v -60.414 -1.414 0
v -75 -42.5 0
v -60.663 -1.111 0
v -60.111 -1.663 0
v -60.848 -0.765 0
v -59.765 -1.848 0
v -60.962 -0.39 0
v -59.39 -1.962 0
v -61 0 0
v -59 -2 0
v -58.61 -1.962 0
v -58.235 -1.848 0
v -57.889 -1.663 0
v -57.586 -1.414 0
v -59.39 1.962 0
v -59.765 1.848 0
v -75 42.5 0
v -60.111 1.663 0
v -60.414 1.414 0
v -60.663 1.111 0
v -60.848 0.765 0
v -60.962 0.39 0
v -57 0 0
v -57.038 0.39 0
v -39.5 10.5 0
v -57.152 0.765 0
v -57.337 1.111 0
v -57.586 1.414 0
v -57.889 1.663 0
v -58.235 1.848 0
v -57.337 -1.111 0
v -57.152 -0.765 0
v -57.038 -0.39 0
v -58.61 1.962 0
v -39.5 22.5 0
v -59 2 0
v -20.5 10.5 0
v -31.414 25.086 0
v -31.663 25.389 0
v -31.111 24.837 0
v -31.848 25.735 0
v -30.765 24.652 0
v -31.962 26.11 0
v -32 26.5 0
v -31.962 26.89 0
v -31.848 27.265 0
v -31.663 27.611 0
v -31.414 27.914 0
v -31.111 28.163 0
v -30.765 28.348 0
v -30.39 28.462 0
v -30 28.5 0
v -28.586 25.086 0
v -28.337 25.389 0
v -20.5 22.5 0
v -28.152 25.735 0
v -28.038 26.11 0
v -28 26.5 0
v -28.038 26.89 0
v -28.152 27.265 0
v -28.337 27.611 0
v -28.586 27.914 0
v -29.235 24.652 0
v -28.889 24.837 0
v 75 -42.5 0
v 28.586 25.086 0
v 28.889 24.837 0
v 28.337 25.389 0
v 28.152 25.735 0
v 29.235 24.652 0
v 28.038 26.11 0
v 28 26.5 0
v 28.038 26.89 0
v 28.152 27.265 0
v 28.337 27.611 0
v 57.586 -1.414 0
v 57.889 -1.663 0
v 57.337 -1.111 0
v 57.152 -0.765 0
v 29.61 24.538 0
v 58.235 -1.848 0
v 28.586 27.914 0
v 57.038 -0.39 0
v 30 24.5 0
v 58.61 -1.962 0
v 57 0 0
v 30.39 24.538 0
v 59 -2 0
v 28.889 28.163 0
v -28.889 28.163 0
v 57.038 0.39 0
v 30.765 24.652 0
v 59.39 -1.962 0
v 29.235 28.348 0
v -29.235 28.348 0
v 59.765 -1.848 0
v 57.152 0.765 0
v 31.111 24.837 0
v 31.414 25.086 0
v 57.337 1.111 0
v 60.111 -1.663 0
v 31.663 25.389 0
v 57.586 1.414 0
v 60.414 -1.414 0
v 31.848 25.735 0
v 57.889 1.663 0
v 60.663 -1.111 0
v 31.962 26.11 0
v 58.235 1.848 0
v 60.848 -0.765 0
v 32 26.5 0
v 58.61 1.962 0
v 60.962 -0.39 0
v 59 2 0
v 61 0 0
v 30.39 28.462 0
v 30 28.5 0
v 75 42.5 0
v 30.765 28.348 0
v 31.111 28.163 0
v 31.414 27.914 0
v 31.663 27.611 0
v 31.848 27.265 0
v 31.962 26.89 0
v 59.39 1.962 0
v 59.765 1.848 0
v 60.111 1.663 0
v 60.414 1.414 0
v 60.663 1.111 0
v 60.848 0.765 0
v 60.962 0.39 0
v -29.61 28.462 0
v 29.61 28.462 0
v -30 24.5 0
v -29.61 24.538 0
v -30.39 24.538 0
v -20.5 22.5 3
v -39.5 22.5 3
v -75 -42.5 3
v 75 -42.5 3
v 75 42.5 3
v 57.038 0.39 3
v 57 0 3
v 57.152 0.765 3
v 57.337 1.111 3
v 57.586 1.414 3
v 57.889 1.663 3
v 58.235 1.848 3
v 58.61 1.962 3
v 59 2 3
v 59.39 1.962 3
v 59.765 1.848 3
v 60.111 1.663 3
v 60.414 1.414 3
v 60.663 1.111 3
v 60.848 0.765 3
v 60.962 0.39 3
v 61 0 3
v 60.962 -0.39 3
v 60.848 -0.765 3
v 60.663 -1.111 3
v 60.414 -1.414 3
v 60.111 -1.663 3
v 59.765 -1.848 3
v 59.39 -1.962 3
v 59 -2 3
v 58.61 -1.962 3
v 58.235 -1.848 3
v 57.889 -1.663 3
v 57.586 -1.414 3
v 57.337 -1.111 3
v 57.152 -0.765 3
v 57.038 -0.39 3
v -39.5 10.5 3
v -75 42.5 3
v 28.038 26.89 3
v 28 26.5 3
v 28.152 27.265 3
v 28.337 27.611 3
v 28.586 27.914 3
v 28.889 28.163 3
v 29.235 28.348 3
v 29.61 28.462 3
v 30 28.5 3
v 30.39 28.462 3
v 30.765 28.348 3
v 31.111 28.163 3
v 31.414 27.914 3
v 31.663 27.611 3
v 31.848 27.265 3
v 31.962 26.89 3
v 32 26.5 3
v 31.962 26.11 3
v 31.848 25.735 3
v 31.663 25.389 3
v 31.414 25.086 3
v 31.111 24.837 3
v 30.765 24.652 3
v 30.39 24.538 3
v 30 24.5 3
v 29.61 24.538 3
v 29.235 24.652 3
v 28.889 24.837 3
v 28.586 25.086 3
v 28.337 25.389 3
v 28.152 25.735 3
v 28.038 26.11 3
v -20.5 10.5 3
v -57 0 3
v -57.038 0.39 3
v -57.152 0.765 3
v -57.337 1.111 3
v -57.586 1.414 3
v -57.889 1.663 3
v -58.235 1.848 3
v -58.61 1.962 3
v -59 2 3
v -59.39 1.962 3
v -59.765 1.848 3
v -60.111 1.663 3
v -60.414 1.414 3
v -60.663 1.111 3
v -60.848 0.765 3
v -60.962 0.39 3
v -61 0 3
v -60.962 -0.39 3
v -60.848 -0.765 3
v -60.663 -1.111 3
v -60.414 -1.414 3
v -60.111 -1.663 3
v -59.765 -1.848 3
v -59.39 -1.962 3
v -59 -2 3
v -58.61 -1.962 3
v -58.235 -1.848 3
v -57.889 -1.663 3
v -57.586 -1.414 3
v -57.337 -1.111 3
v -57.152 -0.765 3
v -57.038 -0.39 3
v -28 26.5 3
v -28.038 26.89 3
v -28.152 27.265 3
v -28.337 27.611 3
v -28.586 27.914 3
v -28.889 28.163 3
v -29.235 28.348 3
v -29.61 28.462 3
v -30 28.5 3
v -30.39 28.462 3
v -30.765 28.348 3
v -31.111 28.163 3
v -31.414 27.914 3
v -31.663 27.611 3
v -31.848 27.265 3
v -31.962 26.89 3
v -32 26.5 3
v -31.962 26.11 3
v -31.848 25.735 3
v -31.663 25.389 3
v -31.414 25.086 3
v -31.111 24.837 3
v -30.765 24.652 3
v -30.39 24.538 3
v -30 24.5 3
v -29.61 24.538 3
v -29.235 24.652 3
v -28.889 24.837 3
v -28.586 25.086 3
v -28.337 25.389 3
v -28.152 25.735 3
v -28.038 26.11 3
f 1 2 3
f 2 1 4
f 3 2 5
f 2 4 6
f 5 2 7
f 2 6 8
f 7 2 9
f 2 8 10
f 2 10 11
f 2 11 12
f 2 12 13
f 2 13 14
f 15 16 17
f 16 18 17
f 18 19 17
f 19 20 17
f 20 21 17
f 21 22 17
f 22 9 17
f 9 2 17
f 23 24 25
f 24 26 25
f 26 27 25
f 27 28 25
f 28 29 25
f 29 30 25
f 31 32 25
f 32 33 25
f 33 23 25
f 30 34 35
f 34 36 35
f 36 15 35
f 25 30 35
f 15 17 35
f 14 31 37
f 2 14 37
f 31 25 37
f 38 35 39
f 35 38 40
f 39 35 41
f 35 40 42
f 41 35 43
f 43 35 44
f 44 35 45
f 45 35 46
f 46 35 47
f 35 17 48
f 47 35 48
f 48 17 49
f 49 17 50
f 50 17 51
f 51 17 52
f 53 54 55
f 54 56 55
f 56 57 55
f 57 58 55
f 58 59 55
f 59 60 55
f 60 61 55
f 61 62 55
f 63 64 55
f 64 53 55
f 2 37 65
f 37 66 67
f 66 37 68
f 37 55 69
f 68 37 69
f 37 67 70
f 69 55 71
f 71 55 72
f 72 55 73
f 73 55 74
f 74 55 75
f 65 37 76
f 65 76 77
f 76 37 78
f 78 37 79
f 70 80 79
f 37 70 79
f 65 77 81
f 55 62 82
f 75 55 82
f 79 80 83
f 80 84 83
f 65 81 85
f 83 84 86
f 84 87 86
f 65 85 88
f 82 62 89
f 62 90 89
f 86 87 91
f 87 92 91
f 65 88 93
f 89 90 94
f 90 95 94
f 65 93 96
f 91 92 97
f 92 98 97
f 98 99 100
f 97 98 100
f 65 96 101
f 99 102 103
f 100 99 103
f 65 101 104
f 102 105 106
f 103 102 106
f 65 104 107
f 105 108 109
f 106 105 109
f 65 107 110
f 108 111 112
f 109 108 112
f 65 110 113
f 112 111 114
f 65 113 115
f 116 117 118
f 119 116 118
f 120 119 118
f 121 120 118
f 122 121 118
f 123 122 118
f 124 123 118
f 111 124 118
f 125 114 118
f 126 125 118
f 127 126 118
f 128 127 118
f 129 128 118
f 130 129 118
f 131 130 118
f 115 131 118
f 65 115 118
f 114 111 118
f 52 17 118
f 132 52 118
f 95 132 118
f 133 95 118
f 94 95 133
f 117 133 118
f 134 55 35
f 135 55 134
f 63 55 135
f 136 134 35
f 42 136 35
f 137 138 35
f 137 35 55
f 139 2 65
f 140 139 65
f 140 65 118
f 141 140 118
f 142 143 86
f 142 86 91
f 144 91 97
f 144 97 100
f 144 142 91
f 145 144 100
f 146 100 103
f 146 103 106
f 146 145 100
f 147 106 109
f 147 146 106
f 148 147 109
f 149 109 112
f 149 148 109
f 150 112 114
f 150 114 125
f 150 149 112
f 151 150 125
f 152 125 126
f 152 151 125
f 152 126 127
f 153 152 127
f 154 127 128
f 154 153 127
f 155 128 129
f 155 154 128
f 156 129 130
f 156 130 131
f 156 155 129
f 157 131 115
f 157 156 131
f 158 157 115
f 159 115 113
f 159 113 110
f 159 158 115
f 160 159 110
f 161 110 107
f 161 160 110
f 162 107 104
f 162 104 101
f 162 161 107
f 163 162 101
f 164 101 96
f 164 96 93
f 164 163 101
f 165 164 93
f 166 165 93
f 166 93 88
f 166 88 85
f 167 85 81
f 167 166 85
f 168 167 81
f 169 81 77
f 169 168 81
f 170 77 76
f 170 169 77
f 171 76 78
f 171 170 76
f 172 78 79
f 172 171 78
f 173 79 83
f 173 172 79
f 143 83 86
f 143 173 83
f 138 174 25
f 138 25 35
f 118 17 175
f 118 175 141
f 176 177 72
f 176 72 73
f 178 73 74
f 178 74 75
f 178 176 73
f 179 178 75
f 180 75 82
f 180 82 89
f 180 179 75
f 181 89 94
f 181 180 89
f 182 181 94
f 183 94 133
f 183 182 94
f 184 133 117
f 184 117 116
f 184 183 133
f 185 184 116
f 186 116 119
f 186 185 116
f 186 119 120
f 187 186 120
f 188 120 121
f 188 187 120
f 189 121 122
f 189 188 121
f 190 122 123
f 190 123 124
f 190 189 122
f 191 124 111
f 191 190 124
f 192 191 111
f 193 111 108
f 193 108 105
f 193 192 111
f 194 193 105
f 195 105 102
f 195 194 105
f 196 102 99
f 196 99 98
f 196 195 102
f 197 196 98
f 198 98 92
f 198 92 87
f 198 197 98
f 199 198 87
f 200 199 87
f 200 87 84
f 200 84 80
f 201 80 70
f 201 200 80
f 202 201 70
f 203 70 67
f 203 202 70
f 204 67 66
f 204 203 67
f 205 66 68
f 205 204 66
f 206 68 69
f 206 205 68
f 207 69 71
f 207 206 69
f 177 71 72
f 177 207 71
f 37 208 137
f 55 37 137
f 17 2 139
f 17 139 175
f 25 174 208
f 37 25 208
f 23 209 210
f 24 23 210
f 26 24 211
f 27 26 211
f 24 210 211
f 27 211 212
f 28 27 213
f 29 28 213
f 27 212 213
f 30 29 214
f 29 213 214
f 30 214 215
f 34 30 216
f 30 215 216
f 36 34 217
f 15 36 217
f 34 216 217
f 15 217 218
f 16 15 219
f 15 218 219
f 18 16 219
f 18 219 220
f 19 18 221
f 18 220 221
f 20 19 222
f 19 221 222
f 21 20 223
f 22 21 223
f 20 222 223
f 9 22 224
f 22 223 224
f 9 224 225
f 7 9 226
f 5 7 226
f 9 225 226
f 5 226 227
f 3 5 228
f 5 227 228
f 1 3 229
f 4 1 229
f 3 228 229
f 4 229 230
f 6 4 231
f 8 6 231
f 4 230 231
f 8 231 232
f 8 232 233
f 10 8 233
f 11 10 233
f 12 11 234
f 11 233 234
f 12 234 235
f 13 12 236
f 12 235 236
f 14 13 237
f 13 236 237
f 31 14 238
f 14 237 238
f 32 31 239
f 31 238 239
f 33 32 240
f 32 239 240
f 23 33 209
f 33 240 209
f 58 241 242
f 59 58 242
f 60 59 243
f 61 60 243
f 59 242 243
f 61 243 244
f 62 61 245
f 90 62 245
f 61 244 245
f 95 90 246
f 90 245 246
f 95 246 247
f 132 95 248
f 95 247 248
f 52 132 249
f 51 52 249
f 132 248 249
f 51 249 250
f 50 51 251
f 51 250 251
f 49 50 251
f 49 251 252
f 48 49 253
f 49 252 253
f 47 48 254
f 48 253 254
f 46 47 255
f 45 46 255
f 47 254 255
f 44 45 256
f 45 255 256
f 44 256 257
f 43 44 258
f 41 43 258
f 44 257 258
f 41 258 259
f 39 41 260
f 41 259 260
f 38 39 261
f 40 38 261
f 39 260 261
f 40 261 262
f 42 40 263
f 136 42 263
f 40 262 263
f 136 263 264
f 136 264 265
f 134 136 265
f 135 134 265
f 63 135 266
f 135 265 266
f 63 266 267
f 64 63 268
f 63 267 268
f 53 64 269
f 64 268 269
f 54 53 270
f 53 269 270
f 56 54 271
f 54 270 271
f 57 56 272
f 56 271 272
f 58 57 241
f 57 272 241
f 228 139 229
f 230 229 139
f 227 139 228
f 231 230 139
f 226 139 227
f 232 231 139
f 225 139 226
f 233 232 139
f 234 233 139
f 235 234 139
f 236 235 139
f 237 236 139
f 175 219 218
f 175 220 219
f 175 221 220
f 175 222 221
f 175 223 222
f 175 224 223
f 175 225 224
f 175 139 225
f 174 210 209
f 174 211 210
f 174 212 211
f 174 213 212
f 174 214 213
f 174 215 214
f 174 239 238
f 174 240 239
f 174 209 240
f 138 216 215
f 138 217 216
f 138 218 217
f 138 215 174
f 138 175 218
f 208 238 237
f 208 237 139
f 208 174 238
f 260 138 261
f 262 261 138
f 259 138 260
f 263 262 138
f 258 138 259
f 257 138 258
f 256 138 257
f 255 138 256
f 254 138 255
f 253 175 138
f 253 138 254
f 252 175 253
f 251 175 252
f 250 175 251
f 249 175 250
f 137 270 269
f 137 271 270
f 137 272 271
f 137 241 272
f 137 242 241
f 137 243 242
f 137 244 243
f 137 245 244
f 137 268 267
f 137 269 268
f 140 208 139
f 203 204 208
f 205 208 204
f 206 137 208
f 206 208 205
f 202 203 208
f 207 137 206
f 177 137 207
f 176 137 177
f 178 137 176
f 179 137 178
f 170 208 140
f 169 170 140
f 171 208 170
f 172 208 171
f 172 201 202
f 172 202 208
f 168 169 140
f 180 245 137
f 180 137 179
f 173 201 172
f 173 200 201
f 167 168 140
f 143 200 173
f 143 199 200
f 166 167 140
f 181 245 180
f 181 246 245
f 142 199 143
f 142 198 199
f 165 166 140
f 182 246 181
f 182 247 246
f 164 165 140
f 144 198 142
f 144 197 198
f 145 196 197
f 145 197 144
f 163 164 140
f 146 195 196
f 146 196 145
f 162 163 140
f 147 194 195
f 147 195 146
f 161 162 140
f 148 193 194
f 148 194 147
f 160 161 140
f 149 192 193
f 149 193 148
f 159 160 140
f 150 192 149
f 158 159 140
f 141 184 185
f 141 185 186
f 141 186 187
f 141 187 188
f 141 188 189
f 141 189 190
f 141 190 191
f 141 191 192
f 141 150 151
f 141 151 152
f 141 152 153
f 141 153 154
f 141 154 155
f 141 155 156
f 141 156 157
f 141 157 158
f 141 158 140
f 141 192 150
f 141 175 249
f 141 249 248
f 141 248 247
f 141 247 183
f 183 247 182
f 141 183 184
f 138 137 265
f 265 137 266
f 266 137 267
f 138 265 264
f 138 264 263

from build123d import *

# Parameters (mm, degrees)
SKETCH1_W           = 150
SKETCH1_H           = 85
BOSS_EXTRUDE1_DEPTH = 3
SKETCH2_R           = 2
CUT_EXTRUDE1_DEPTH  = 3
SKETCH3_R           = 2
CUT_EXTRUDE2_DEPTH  = 3
CUT_EXTRUDE4_REACH  = 5
SKETCH5_W           = 19
SKETCH5_H           = 12


with BuildPart() as part:
    # Sketch1 → Boss-Extrude1 (new body)
    with BuildSketch(Plane.XY):
        Rectangle(SKETCH1_W, SKETCH1_H)
    extrude(amount=BOSS_EXTRUDE1_DEPTH)

    # Sketch2 → Cut-Extrude1 (cut)
    with BuildSketch(Plane.XY.offset(3)):
        with Locations((-30, 26.5)):
            Circle(SKETCH2_R)
    cut_extrude1 = extrude(amount=-CUT_EXTRUDE1_DEPTH, mode=Mode.SUBTRACT)

    # Mirror1: Cut-Extrude1 across plane
    add(cut_extrude1.mirror(Plane(origin=(0, 0, 0), x_dir=(0, 0, 1), z_dir=(1, 0, 0))), mode=Mode.SUBTRACT)

    # Sketch3 → Cut-Extrude2 (cut)
    with BuildSketch(Plane.XY.offset(3)):
        with Locations((-59, 0)):
            Circle(SKETCH3_R)
    cut_extrude2 = extrude(amount=-CUT_EXTRUDE2_DEPTH, mode=Mode.SUBTRACT)

    # Mirror2: Cut-Extrude2 across plane
    add(cut_extrude2.mirror(Plane(origin=(0, 0, 0), x_dir=(0, 0, 1), z_dir=(1, 0, 0))), mode=Mode.SUBTRACT)

    # Sketch5 → Cut-Extrude4 (cut, up to next)
    with BuildSketch(Plane.XY.offset(3), mode=Mode.PRIVATE) as cut_extrude4_sk1:
        with Locations((-30, 16.5)):
            Rectangle(SKETCH5_W, SKETCH5_H)
    cut_extrude4_tool1 = extrude(cut_extrude4_sk1.sketch, amount=-CUT_EXTRUDE4_REACH, mode=Mode.PRIVATE) & part.part
    add(cut_extrude4_tool1.solids().sort_by_distance((-30, 16.5, 3))[0], mode=Mode.SUBTRACT)


solid = part.part
